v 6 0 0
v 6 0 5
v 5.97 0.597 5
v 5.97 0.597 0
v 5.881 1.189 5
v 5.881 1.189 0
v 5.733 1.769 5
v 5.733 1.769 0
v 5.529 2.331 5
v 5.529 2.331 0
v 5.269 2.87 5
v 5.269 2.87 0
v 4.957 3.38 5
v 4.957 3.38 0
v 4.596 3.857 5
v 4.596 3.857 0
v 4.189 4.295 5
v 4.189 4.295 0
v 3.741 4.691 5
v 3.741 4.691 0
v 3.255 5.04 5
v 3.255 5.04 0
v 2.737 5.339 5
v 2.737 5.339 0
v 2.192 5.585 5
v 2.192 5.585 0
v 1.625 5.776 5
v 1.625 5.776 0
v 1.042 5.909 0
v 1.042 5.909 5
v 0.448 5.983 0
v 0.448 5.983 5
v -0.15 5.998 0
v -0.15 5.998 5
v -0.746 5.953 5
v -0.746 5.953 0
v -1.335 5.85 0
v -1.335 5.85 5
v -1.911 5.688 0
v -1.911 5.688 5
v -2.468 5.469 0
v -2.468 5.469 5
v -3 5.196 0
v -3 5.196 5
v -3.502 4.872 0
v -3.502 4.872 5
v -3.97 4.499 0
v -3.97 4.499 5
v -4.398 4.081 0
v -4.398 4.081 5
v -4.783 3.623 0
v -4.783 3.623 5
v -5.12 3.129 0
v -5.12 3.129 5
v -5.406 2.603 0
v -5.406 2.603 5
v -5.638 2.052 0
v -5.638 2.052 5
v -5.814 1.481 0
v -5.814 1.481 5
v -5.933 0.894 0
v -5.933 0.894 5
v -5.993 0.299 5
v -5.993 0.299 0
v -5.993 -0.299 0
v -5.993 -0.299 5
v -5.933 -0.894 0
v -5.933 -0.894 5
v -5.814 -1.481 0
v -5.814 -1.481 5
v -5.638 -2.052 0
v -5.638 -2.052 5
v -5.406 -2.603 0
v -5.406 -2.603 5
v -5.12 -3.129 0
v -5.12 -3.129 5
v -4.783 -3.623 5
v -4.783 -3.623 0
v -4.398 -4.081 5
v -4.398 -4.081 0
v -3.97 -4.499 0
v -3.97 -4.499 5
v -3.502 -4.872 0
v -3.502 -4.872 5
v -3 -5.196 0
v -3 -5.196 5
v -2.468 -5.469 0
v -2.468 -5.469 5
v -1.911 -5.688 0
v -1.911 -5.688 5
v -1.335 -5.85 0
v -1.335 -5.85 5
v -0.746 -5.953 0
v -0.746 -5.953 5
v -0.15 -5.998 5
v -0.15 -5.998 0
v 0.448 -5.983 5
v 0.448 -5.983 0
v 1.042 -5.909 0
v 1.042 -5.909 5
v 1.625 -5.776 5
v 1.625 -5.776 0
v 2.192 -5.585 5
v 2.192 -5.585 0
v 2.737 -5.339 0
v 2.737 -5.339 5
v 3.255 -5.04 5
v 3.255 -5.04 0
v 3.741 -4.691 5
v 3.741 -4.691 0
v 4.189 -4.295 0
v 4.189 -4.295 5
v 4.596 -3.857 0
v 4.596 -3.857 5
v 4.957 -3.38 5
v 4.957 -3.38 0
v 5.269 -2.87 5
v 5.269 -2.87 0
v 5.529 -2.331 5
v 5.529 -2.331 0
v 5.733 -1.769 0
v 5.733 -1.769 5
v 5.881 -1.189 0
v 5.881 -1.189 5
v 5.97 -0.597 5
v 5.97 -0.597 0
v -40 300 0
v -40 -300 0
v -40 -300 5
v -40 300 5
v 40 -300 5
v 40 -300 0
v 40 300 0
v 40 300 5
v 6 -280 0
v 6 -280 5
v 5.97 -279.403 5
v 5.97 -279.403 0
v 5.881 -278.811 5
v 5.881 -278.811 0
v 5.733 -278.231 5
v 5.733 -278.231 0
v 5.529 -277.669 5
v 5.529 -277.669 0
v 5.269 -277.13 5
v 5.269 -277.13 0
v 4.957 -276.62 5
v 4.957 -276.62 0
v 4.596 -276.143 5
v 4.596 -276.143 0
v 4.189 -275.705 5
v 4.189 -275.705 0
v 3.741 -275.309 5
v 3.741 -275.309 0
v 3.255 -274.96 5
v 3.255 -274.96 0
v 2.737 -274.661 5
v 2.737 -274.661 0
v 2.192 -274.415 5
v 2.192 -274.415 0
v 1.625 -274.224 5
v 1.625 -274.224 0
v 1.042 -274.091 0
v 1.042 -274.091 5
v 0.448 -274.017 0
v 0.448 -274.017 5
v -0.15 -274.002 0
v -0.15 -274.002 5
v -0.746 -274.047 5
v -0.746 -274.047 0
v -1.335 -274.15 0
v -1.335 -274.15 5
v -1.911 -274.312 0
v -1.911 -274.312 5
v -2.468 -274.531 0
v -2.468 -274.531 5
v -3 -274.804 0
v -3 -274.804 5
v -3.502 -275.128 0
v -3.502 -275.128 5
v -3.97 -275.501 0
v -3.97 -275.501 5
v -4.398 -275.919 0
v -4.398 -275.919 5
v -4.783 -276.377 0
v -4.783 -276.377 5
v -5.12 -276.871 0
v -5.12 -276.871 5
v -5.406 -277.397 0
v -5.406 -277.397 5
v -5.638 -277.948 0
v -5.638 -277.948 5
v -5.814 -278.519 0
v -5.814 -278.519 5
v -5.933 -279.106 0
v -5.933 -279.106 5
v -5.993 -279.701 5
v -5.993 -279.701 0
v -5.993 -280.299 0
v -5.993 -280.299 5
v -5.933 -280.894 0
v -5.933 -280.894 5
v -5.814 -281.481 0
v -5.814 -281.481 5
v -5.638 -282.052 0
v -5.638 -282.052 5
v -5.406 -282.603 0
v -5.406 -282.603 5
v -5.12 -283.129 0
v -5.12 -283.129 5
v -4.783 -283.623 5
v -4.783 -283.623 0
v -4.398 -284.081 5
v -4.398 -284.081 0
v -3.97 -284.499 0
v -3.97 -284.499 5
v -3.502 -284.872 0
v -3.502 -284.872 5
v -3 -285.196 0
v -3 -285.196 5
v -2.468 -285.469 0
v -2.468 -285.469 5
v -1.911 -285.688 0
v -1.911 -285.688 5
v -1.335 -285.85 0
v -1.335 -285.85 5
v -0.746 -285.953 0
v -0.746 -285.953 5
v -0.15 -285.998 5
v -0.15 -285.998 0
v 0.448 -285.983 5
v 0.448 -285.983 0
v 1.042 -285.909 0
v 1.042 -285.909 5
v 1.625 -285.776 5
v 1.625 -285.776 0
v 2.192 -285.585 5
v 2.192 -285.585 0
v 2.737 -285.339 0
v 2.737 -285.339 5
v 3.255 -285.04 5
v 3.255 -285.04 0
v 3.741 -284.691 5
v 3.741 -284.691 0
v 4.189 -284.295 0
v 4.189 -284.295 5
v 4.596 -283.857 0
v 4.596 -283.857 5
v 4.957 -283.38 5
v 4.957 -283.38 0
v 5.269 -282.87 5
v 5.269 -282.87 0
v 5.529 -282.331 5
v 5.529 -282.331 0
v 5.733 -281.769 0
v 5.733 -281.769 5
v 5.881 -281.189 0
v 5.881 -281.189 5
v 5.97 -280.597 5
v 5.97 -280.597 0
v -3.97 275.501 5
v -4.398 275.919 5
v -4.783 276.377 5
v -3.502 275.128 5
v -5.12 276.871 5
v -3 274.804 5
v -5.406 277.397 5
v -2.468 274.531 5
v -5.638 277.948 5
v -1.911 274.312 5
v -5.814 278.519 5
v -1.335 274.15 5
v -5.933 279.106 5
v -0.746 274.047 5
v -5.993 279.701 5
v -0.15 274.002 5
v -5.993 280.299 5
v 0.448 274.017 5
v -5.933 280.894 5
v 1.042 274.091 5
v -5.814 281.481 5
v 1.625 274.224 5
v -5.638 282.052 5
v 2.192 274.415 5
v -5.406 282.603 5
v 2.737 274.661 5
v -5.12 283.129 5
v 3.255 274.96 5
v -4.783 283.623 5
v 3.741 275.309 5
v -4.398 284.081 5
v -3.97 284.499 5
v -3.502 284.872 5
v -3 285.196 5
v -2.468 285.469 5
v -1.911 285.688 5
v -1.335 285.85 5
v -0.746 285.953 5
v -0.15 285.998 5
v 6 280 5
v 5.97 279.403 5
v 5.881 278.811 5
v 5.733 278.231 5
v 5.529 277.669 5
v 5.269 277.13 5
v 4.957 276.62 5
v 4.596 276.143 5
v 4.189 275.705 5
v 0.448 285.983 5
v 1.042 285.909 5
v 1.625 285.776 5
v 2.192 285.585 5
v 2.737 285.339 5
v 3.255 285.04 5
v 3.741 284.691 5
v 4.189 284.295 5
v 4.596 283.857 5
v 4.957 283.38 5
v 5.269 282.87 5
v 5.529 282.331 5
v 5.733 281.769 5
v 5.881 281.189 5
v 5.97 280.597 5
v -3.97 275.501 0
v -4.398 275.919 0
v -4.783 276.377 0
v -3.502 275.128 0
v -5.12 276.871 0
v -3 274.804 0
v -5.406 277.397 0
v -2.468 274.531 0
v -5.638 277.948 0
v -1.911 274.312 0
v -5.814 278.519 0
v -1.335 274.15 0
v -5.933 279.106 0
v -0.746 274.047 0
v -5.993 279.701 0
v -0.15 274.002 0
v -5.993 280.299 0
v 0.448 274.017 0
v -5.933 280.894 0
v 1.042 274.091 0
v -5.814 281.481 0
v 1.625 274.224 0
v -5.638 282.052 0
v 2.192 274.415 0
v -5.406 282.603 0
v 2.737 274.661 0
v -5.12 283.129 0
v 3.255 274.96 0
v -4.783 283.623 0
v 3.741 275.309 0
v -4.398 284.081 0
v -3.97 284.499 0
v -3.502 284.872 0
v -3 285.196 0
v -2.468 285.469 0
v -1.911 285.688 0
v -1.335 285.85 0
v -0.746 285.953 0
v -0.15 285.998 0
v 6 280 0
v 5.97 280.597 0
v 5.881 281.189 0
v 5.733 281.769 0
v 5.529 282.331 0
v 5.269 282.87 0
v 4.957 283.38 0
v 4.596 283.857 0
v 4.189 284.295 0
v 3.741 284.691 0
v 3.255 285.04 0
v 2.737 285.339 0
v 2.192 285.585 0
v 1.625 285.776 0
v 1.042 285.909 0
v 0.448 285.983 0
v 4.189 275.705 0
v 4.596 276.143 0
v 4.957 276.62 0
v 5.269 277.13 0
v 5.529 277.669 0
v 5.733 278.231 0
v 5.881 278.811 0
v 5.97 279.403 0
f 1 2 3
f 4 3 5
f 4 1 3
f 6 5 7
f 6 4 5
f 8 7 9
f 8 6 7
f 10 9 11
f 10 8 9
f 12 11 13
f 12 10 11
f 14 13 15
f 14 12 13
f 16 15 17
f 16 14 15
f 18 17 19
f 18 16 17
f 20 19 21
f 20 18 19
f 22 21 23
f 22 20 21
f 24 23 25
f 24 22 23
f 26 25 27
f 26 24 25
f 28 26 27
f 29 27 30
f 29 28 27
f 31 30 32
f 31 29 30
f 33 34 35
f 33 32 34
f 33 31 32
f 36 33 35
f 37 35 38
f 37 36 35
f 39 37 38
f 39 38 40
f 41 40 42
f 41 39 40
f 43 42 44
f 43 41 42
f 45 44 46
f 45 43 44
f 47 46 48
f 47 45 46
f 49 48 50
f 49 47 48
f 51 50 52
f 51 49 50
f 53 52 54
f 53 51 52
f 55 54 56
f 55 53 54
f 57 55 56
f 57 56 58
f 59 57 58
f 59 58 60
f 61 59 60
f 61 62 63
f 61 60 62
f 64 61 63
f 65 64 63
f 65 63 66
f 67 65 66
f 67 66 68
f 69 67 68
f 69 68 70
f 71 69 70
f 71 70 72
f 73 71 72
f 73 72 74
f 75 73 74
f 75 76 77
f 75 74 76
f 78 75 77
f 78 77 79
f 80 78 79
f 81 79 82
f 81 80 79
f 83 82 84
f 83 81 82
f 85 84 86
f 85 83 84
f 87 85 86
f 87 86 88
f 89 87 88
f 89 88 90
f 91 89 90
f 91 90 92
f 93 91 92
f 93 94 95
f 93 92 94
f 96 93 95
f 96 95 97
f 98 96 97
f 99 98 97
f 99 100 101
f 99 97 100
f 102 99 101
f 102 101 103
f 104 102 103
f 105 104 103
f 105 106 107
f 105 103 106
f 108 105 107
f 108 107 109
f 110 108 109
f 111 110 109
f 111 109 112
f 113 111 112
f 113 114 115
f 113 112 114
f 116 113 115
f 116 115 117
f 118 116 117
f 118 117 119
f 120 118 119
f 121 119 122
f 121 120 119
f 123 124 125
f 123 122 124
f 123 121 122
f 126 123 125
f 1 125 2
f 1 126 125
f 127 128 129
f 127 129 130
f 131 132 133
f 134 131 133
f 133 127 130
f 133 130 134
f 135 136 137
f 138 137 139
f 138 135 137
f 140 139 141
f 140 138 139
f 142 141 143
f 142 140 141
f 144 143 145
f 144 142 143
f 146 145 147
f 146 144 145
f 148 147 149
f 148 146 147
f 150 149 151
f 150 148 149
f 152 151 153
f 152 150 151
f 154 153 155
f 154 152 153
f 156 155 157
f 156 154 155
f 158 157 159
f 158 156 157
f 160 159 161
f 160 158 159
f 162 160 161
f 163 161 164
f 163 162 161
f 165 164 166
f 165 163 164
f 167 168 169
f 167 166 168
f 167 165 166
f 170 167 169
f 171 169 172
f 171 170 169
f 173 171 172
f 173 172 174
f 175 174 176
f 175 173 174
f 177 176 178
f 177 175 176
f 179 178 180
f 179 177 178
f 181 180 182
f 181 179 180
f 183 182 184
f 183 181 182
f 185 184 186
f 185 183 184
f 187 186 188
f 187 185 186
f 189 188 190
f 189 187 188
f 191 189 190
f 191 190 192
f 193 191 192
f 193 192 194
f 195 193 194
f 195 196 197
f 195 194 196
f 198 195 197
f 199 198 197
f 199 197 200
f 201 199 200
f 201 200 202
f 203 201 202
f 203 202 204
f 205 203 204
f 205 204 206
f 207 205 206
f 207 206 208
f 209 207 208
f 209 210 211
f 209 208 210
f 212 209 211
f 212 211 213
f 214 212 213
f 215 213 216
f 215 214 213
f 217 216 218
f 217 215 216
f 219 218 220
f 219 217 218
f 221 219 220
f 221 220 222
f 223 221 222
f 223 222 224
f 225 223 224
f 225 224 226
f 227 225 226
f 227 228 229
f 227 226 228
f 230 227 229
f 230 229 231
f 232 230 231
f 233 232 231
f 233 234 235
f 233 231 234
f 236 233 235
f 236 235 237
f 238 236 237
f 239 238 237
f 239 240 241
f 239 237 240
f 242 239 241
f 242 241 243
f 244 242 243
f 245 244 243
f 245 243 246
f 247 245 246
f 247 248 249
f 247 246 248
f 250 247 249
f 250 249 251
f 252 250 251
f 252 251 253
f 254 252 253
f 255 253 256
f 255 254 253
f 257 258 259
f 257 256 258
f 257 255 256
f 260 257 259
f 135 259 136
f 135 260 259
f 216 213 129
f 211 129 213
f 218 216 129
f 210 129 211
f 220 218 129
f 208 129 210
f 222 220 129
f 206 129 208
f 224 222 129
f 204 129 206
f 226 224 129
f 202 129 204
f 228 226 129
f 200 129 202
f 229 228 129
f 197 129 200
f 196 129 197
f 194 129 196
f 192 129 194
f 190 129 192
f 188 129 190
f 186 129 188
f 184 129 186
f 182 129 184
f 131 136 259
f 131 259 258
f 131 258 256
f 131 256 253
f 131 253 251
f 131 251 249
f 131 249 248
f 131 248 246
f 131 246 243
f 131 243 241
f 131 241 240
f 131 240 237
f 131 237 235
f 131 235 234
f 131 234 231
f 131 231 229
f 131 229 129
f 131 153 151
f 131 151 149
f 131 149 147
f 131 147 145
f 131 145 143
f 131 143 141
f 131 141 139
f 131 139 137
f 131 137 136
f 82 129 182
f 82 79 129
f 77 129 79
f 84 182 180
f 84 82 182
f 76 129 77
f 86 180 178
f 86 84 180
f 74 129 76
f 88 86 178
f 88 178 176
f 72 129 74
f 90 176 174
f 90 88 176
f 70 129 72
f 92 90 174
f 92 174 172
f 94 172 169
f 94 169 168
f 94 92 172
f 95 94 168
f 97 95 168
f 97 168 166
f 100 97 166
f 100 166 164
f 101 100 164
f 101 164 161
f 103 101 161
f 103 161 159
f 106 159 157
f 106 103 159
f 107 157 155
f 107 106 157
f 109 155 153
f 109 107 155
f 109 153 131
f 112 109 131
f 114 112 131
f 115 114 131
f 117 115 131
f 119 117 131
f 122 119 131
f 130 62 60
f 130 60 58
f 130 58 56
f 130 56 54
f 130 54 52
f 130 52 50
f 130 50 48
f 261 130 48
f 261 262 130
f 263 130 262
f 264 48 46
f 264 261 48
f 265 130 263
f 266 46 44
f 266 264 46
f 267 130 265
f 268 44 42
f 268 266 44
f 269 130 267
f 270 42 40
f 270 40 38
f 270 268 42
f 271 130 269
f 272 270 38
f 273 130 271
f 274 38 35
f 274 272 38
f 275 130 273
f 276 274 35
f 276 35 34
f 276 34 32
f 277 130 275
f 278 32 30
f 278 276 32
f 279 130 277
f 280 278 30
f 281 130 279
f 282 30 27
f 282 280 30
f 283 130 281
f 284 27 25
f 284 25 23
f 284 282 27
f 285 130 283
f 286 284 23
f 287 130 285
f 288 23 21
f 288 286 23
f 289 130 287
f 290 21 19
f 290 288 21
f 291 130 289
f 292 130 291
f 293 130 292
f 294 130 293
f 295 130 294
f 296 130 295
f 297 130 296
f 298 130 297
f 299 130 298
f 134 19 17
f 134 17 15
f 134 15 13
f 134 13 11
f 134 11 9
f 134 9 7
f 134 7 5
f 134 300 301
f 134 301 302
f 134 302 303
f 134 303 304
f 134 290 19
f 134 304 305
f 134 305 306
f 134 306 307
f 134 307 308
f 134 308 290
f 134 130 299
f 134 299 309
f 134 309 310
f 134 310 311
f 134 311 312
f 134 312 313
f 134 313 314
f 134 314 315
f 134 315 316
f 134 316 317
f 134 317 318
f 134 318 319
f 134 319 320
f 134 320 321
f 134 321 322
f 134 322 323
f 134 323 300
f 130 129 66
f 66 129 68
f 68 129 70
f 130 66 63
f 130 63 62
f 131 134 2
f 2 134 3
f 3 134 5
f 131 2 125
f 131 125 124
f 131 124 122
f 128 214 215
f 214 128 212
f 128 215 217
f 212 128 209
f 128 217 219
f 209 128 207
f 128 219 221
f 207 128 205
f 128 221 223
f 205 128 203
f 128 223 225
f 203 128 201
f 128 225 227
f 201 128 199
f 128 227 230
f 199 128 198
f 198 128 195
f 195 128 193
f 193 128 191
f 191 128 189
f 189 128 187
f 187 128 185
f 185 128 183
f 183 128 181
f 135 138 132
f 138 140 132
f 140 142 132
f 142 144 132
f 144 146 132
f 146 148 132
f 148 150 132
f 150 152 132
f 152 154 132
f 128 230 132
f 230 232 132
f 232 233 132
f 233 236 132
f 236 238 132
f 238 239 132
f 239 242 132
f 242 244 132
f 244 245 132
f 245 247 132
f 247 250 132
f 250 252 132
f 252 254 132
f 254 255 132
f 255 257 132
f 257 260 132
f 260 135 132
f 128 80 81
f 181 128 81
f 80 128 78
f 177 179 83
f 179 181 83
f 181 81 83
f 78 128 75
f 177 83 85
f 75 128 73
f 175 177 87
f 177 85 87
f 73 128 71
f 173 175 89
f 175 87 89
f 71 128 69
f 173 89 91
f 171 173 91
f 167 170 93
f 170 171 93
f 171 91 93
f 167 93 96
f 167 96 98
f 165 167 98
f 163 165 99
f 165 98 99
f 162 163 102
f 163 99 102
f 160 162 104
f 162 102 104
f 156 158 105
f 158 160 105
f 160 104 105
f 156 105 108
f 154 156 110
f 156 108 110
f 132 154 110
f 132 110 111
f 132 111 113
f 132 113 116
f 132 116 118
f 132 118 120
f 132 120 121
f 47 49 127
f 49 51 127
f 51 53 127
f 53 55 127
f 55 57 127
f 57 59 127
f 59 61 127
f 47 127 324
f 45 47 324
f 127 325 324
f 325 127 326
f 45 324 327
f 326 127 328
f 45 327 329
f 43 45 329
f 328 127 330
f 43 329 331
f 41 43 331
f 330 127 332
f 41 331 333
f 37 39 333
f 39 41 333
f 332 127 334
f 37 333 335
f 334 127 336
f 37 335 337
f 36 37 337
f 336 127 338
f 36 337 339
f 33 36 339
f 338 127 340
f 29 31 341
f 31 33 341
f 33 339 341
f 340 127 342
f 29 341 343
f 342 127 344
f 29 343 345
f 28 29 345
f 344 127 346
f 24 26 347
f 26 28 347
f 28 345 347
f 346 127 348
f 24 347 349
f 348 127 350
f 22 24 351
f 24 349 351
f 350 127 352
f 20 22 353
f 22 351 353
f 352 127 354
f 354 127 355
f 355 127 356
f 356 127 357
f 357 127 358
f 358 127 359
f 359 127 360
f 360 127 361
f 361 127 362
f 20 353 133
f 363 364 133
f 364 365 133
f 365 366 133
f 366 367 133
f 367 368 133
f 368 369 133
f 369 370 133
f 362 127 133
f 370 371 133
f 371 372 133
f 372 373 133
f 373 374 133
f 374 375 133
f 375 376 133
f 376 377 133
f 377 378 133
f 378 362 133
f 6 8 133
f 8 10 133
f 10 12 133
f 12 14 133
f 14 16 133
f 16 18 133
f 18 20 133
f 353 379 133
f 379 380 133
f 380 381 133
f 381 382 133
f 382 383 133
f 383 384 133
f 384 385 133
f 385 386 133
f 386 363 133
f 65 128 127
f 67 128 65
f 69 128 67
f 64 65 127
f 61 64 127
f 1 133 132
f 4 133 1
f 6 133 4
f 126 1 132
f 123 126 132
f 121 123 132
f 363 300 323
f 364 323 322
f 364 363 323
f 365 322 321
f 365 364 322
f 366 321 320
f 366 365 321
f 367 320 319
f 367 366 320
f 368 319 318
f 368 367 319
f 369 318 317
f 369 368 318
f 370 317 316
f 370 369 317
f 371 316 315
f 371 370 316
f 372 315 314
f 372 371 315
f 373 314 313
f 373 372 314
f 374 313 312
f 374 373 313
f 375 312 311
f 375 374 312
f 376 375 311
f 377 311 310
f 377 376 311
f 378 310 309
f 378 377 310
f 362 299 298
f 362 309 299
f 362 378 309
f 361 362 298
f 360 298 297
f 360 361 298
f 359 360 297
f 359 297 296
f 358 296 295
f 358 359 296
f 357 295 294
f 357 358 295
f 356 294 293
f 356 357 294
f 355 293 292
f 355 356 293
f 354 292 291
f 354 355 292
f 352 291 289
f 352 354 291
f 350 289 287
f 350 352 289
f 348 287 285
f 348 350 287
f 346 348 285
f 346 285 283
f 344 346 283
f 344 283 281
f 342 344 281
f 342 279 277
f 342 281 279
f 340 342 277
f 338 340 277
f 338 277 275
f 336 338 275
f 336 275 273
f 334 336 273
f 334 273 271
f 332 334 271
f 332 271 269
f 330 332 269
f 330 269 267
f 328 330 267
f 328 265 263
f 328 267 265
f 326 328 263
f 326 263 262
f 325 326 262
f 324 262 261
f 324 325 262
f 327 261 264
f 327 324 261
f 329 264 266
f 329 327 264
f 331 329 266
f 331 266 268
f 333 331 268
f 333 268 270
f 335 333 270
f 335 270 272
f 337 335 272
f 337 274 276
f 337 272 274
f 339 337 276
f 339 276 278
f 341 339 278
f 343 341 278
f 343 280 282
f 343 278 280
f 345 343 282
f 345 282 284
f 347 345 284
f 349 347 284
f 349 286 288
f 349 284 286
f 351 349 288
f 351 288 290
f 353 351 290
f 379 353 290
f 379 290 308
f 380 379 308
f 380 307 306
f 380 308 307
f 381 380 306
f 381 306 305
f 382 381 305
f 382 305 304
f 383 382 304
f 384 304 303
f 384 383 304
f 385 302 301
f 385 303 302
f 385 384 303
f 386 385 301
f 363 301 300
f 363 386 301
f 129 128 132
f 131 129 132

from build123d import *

# Parameters (mm, degrees)
F0_W     = 80
F0_H     = 600
F1_DEPTH = 5
F2_R     = 6
F3_DEPTH = 25


with BuildPart() as f1:
    # F0 (on Top) → F1 (new body)
    with BuildSketch(Plane.XY):
        Rectangle(F0_W, F0_H)
    extrude(amount=F1_DEPTH)

    # F2 (on Top) → F3 (cut)
    with BuildSketch(Plane.XY):
        with Locations((0, 280)):
            Circle(F2_R)
        Circle(F2_R)
        with Locations((0, -280)):
            Circle(F2_R)
    extrude(amount=F3_DEPTH, mode=Mode.SUBTRACT)


solid = f1.part
